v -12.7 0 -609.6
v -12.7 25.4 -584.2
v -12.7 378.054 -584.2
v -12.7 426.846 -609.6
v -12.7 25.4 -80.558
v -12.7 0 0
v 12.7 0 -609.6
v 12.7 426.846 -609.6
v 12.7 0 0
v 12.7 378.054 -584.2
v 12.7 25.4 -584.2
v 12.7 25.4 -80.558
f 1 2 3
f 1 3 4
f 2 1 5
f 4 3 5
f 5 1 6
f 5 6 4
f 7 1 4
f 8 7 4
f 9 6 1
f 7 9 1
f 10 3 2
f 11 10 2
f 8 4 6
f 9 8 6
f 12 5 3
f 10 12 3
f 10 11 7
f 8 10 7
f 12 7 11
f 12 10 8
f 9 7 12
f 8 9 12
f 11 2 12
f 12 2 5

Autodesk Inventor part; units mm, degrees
ref_plane "YZ Plane" through (0, 0, 0) normal (1, 0, 0) x (0, 1, 0)
ref_plane "XZ Plane" through (0, 0, 0) normal (0, 1, 0) x (-1, 0, 0)
ref_plane "XY Plane" through (0, 0, 0) normal (0, 0, 1) x (1, 0, 0)
sketch "Sketch1" plane through (0, 0, 0) normal (1, 0, 0) x (0, 1, 0)
  line L0 (0, 0) -> (0, -609.6)
  line L1 (0, -609.6) -> (426.8465, -609.6)
  line L2 (426.8465, -609.6) -> (0, 0)
  line L3 (25.4, -80.5585) -> (378.0536, -584.2)
  line L4 (378.0536, -584.2) -> (25.4, -584.2)
  line L5 (25.4, -584.2) -> (25.4, -80.5585)
  dimension "d0" = 609.6
  dimension "d1" = 35
  dimension "d2" = 25.4
  dimension "d3" = 25.4
  dimension "d4" = 25.4
extrude "Extrusion1" add sketch "Sketch1" along normal mid plane 25.4
sketch "Sketch2" plane through (12.7, 0, 0) normal (1, 0, 0) x (0, 0, -1)
  line L0 (0, 0) -> (609.6, 0) projected
  line L1 (0, 0) -> (653.0822, 457.2931)
  line L2 (80.5585, 25.4) -> (584.2, 378.0536) projected
  line L3 (79.2672, 24.4958) -> (584.2, 378.0536)
  line L4 (584.2, 378.0536) -> (657.7963, 429.5863)
  line L5 (584.2, 25.4) -> (80.5585, 25.4) projected
  line L6 (80.5585, 25.4) -> (44.2835, 0)
  line L7 (44.2835, 0) -> (0, 0)
  line L8 (609.6, 0) -> (609.6, 426.8465) projected
  line L9 (609.6, 426.8465) -> (609.6, 393.6892)
  point P0 (609.6, 511.5151)
  point P1 (68.5783, 24.3867)
  point P2 (69.7859, 25.4)
properties part number "ballRampLeftSideV04-30-60"
